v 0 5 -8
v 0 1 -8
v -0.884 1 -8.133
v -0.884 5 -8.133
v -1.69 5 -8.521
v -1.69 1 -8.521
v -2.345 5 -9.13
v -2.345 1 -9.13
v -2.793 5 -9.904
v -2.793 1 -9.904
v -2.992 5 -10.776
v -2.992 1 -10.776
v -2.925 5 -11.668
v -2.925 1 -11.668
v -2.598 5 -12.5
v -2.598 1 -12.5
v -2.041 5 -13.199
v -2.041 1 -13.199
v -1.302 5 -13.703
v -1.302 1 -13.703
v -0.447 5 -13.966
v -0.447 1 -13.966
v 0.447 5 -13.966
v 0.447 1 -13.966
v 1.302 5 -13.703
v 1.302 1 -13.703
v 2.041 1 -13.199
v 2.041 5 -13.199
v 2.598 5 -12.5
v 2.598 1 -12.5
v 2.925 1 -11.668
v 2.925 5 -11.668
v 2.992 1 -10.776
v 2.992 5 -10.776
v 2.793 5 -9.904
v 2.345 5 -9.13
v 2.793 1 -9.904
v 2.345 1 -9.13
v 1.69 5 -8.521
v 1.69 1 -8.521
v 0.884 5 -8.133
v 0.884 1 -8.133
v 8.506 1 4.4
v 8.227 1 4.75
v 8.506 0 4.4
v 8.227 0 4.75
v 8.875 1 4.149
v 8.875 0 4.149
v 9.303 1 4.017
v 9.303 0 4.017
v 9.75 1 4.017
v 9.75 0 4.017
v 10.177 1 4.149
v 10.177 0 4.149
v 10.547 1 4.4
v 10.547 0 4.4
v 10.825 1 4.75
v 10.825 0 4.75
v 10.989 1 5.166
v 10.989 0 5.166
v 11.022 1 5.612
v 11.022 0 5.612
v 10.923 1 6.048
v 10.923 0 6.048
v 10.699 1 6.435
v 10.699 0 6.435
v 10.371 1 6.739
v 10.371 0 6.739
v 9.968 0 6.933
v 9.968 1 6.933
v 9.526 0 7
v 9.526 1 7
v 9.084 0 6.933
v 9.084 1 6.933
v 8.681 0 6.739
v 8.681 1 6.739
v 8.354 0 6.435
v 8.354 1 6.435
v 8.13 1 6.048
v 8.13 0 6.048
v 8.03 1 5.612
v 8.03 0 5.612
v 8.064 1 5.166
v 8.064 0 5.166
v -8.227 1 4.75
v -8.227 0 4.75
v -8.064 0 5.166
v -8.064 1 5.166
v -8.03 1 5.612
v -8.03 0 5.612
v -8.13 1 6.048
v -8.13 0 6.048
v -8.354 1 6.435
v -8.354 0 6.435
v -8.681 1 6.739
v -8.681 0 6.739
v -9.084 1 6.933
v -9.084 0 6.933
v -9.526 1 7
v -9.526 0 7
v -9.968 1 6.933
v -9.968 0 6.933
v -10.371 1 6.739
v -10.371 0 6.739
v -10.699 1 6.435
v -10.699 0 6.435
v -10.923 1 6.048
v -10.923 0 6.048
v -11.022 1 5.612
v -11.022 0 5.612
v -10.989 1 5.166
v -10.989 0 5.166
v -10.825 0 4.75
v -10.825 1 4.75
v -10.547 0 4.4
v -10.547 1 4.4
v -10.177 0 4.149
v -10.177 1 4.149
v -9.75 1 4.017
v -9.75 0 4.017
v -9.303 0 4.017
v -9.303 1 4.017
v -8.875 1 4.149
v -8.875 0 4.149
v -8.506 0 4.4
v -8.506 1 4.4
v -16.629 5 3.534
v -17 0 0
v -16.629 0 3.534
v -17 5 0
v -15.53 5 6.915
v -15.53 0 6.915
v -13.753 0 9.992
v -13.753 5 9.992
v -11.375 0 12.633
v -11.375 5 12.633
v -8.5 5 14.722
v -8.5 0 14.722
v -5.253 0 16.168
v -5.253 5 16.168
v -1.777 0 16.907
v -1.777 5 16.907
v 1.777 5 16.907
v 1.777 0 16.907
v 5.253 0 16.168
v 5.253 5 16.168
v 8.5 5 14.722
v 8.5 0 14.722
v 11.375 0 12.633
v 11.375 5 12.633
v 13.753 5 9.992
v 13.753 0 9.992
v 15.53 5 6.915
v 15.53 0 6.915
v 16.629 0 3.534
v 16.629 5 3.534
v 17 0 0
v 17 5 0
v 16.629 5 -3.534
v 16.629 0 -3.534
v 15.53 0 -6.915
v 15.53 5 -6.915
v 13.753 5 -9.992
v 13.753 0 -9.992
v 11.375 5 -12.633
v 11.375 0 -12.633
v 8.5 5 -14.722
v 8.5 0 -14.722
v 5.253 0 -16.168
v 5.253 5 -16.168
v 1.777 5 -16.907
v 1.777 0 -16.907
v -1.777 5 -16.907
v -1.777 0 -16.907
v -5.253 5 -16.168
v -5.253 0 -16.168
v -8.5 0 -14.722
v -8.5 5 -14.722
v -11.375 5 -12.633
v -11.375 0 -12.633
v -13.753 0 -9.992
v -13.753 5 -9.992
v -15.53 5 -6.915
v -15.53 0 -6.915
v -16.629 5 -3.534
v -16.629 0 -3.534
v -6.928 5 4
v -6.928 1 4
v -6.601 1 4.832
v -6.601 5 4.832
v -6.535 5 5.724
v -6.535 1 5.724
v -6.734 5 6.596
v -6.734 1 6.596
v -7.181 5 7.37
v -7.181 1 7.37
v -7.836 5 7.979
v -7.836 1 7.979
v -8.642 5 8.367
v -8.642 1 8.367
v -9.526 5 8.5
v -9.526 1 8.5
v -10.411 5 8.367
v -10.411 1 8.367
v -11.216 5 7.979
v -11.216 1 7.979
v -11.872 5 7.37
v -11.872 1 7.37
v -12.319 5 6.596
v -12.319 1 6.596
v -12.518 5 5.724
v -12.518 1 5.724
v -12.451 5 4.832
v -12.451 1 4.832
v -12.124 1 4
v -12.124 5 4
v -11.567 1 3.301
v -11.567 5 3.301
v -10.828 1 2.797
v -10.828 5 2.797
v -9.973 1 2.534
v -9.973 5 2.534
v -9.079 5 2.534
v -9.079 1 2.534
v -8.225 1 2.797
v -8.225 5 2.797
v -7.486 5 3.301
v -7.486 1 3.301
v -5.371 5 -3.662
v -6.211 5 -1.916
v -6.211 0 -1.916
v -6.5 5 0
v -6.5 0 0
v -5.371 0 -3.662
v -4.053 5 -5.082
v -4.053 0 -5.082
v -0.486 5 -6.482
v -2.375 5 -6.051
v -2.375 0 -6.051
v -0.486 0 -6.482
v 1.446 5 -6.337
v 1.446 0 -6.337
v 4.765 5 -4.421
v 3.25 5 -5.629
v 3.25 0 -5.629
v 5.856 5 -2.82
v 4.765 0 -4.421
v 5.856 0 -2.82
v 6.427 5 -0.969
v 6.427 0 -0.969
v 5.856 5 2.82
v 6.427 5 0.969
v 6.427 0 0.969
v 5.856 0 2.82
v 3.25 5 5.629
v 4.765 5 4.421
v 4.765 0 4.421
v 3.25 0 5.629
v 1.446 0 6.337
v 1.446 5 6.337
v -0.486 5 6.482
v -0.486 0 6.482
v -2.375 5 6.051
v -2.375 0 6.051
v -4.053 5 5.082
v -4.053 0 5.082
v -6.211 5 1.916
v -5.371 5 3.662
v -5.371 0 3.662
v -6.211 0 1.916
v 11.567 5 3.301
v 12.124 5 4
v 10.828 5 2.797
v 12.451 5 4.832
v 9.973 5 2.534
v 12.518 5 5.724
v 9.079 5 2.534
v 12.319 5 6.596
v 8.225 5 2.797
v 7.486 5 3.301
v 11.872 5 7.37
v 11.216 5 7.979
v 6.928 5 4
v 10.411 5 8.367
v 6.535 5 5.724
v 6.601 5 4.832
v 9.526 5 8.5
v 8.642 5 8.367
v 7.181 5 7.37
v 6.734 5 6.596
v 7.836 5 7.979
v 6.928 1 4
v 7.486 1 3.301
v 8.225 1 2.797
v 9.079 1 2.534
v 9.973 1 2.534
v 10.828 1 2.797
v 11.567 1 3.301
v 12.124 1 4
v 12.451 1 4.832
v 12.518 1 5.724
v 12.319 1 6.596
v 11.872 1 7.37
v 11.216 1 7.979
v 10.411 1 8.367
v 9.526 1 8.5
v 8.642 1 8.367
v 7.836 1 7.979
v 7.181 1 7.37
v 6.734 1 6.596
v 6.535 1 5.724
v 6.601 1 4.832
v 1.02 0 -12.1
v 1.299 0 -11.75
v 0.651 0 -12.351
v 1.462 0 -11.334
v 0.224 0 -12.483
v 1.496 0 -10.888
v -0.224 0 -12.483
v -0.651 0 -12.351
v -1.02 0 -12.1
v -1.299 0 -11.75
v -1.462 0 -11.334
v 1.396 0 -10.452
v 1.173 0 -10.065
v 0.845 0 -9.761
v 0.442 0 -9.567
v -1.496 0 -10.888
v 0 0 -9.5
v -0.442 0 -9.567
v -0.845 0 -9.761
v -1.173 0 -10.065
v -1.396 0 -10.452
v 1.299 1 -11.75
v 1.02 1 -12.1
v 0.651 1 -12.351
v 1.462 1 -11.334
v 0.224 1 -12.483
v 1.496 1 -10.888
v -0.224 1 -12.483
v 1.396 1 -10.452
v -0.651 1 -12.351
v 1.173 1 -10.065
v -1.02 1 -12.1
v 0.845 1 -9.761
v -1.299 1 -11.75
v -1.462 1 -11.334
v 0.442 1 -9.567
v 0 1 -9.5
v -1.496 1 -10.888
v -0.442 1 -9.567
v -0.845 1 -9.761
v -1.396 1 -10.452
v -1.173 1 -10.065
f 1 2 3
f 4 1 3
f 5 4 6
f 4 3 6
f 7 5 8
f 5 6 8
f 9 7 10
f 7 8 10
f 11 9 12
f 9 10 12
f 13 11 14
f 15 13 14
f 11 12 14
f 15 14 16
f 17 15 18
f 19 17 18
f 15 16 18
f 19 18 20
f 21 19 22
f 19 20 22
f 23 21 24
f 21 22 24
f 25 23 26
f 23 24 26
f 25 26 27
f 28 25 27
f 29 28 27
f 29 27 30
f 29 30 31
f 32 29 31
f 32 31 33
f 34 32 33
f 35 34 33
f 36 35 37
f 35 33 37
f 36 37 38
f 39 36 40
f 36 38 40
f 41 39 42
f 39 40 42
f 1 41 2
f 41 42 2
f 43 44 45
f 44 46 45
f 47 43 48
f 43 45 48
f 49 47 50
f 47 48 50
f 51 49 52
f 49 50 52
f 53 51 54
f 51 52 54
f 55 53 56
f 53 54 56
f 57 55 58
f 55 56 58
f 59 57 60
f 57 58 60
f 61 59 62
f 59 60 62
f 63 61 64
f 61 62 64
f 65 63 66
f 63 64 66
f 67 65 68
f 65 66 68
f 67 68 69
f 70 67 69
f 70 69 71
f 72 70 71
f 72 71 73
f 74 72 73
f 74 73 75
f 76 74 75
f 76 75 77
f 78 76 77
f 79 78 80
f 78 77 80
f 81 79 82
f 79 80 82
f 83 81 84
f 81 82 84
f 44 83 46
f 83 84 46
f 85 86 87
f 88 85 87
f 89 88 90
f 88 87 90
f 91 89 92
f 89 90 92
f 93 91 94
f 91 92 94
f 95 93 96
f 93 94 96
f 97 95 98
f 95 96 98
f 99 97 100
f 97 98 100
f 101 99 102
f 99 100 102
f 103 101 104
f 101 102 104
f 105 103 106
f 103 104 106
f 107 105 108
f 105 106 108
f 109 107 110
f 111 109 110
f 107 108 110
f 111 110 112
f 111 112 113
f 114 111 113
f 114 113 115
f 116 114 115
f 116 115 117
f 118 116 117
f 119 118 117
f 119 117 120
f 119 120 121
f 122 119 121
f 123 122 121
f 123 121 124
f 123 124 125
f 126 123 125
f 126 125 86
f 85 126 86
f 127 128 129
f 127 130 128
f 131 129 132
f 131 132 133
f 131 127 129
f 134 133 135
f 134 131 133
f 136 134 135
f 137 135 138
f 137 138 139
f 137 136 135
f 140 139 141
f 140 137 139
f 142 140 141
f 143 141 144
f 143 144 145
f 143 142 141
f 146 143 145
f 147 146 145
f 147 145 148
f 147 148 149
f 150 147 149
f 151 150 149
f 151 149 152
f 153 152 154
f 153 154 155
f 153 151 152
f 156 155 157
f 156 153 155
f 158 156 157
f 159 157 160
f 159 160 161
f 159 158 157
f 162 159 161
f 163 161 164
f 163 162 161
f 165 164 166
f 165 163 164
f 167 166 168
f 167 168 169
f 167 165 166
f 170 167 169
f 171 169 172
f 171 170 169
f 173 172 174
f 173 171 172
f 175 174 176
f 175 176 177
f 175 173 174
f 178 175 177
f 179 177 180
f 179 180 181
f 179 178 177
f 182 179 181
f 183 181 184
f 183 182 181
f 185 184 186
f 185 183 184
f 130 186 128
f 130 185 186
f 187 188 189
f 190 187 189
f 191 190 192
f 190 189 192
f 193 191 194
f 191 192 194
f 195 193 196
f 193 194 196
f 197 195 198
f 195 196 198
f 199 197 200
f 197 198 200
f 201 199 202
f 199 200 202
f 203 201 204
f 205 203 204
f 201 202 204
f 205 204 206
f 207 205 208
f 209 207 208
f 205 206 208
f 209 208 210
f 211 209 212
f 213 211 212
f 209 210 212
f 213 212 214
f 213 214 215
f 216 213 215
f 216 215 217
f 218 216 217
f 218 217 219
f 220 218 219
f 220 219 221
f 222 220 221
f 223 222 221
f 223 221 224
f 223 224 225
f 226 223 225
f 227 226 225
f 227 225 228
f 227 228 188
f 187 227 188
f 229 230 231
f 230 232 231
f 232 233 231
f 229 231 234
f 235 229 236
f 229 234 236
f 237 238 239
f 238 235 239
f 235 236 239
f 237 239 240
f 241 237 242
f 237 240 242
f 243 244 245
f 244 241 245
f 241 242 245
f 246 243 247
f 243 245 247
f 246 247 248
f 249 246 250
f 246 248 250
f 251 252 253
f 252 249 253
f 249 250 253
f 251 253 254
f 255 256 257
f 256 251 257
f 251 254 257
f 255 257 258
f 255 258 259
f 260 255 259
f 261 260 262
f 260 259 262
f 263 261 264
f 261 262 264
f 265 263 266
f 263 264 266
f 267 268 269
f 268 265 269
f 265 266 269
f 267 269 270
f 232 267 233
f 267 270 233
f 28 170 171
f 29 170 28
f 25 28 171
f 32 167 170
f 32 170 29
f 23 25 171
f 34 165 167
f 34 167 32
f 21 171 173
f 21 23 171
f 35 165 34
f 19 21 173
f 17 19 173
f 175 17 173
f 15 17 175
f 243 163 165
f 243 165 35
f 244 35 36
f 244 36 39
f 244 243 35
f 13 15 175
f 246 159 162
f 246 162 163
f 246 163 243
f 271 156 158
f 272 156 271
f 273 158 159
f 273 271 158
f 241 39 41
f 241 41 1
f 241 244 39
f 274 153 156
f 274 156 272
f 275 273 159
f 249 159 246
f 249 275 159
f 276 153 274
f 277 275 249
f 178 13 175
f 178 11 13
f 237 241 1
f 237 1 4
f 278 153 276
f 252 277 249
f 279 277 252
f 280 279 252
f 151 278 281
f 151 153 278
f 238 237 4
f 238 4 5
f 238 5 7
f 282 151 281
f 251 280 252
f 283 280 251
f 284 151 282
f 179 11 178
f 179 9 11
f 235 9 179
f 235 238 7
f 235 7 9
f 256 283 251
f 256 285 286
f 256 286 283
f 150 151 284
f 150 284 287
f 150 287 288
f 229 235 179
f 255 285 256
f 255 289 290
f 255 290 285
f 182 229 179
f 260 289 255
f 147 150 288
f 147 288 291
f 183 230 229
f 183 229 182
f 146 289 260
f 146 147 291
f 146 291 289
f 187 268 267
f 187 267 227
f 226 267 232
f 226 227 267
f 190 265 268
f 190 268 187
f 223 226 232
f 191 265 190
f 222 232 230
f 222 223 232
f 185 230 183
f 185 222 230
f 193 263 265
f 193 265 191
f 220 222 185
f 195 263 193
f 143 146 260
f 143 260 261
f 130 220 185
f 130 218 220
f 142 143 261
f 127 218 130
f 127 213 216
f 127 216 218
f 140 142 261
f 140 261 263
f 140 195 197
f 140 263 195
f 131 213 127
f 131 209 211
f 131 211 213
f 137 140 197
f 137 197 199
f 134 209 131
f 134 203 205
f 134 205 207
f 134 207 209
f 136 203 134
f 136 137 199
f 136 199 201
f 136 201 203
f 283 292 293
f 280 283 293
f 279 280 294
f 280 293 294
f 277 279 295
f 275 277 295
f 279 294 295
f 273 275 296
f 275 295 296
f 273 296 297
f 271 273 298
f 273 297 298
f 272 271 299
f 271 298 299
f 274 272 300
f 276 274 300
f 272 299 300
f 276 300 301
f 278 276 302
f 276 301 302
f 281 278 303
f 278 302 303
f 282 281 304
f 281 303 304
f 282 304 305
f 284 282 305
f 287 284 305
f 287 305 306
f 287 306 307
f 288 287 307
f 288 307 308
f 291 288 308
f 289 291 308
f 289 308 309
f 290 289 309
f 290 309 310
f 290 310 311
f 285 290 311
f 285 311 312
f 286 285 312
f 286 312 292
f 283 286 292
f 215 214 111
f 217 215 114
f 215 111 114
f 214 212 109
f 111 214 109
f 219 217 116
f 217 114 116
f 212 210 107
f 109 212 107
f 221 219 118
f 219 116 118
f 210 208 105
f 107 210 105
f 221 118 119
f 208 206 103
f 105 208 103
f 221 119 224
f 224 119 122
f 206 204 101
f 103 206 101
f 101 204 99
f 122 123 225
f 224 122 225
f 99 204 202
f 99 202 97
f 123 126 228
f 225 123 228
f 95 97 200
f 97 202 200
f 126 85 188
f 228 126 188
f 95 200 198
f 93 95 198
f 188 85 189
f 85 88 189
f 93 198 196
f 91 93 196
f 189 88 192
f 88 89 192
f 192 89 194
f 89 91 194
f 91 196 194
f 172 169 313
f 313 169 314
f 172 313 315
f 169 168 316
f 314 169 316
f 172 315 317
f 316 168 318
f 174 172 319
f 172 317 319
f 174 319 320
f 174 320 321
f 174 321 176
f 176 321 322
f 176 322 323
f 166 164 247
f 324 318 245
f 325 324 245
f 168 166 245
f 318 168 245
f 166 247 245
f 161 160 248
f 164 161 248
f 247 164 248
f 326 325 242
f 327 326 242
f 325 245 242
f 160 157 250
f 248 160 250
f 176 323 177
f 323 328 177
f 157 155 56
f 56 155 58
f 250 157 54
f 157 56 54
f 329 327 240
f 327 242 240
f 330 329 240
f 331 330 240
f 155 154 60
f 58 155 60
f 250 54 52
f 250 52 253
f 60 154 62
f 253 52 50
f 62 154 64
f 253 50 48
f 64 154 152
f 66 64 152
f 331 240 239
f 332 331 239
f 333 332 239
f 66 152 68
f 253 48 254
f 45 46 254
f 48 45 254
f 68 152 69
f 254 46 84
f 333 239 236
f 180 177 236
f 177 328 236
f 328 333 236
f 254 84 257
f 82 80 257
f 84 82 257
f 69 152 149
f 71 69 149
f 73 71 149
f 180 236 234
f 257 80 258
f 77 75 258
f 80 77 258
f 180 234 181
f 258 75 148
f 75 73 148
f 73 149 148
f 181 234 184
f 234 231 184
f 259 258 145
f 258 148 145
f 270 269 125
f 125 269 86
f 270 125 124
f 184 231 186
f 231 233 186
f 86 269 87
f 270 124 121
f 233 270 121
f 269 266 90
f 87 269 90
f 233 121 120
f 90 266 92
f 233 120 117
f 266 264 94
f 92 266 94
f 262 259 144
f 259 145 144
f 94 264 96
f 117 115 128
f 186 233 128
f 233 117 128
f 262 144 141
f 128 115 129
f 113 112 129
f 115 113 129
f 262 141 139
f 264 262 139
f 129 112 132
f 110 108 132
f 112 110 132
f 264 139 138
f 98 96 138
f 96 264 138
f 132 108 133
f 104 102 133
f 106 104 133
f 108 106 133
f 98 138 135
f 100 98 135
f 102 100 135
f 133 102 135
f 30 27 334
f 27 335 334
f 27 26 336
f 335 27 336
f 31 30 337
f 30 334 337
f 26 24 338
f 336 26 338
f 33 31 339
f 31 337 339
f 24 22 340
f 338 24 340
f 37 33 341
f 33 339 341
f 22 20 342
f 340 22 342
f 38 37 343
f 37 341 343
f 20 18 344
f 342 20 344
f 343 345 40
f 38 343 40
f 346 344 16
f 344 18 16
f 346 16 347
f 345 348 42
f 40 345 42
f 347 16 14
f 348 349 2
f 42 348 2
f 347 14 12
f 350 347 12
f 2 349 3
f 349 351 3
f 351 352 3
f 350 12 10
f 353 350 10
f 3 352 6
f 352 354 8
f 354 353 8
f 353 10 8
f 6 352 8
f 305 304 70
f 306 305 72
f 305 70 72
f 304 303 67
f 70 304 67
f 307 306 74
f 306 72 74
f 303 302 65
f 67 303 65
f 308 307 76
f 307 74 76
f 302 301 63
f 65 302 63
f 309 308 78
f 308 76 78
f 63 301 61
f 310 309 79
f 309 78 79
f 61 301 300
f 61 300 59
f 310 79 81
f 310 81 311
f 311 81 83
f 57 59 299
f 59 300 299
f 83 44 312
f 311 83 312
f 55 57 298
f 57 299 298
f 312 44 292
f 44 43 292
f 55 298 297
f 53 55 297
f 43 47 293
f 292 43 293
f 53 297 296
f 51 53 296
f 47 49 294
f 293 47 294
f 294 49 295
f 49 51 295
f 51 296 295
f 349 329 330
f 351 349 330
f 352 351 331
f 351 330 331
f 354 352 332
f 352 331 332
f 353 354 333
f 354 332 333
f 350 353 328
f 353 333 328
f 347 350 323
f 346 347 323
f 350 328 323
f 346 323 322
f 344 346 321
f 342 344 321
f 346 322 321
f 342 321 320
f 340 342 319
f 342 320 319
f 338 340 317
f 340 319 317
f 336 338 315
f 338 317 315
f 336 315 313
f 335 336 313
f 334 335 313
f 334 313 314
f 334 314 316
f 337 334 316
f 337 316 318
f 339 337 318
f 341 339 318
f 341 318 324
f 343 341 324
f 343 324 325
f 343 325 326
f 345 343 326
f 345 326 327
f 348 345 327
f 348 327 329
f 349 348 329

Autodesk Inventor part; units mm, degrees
ref_plane "YZ Plane" through (0, 0, 0) normal (1, 0, 0) x (0, 1, 0)
ref_plane "XZ Plane" through (0, 0, 0) normal (0, 1, 0) x (-1, 0, 0)
ref_plane "XY Plane" through (0, 0, 0) normal (0, 0, 1) x (1, 0, 0)
sketch "Sketch1" plane through (0, 0, 0) normal (0, 0, 1) x (1, 0, 0)
  line L0 (-6.5, 0) -> (-17, 0)
  line L1 (-17, 0) -> (-17, 5)
  line L2 (-17, 5) -> (-6.5, 5)
  line L3 (-6.5, 5) -> (-6.5, 0)
  line L4 (0, -1) -> (0, 6) projected
  point P0 (0, 0)
  dimension "d0" = 17
  dimension "d1" = 6.5
  dimension "d2" = 5
revolve "Revolution1" add sketch "Sketch1" angle 360 about axis through (0, -10, 0) along (0, 1, 0)
sketch "Sketch3" plane through (0, 5, 0) normal (0, 1, 0) x (1, 0, 0)
  point P0 (0, 0)
  point P1 (0, 11)
  dimension "d16" = 11
hole "Hole2" at (0, 5, -11) direction (0, -1, 0) diameter 3 end through all counterbore diameter 6 counterbore depth 4
pattern_circular "Circular Pattern1" count 3 over 360 about axis through (0, 2.5, 0) along (0, 1, 0) of "Hole2"
properties part number "Insert_Top" material "Brass"
